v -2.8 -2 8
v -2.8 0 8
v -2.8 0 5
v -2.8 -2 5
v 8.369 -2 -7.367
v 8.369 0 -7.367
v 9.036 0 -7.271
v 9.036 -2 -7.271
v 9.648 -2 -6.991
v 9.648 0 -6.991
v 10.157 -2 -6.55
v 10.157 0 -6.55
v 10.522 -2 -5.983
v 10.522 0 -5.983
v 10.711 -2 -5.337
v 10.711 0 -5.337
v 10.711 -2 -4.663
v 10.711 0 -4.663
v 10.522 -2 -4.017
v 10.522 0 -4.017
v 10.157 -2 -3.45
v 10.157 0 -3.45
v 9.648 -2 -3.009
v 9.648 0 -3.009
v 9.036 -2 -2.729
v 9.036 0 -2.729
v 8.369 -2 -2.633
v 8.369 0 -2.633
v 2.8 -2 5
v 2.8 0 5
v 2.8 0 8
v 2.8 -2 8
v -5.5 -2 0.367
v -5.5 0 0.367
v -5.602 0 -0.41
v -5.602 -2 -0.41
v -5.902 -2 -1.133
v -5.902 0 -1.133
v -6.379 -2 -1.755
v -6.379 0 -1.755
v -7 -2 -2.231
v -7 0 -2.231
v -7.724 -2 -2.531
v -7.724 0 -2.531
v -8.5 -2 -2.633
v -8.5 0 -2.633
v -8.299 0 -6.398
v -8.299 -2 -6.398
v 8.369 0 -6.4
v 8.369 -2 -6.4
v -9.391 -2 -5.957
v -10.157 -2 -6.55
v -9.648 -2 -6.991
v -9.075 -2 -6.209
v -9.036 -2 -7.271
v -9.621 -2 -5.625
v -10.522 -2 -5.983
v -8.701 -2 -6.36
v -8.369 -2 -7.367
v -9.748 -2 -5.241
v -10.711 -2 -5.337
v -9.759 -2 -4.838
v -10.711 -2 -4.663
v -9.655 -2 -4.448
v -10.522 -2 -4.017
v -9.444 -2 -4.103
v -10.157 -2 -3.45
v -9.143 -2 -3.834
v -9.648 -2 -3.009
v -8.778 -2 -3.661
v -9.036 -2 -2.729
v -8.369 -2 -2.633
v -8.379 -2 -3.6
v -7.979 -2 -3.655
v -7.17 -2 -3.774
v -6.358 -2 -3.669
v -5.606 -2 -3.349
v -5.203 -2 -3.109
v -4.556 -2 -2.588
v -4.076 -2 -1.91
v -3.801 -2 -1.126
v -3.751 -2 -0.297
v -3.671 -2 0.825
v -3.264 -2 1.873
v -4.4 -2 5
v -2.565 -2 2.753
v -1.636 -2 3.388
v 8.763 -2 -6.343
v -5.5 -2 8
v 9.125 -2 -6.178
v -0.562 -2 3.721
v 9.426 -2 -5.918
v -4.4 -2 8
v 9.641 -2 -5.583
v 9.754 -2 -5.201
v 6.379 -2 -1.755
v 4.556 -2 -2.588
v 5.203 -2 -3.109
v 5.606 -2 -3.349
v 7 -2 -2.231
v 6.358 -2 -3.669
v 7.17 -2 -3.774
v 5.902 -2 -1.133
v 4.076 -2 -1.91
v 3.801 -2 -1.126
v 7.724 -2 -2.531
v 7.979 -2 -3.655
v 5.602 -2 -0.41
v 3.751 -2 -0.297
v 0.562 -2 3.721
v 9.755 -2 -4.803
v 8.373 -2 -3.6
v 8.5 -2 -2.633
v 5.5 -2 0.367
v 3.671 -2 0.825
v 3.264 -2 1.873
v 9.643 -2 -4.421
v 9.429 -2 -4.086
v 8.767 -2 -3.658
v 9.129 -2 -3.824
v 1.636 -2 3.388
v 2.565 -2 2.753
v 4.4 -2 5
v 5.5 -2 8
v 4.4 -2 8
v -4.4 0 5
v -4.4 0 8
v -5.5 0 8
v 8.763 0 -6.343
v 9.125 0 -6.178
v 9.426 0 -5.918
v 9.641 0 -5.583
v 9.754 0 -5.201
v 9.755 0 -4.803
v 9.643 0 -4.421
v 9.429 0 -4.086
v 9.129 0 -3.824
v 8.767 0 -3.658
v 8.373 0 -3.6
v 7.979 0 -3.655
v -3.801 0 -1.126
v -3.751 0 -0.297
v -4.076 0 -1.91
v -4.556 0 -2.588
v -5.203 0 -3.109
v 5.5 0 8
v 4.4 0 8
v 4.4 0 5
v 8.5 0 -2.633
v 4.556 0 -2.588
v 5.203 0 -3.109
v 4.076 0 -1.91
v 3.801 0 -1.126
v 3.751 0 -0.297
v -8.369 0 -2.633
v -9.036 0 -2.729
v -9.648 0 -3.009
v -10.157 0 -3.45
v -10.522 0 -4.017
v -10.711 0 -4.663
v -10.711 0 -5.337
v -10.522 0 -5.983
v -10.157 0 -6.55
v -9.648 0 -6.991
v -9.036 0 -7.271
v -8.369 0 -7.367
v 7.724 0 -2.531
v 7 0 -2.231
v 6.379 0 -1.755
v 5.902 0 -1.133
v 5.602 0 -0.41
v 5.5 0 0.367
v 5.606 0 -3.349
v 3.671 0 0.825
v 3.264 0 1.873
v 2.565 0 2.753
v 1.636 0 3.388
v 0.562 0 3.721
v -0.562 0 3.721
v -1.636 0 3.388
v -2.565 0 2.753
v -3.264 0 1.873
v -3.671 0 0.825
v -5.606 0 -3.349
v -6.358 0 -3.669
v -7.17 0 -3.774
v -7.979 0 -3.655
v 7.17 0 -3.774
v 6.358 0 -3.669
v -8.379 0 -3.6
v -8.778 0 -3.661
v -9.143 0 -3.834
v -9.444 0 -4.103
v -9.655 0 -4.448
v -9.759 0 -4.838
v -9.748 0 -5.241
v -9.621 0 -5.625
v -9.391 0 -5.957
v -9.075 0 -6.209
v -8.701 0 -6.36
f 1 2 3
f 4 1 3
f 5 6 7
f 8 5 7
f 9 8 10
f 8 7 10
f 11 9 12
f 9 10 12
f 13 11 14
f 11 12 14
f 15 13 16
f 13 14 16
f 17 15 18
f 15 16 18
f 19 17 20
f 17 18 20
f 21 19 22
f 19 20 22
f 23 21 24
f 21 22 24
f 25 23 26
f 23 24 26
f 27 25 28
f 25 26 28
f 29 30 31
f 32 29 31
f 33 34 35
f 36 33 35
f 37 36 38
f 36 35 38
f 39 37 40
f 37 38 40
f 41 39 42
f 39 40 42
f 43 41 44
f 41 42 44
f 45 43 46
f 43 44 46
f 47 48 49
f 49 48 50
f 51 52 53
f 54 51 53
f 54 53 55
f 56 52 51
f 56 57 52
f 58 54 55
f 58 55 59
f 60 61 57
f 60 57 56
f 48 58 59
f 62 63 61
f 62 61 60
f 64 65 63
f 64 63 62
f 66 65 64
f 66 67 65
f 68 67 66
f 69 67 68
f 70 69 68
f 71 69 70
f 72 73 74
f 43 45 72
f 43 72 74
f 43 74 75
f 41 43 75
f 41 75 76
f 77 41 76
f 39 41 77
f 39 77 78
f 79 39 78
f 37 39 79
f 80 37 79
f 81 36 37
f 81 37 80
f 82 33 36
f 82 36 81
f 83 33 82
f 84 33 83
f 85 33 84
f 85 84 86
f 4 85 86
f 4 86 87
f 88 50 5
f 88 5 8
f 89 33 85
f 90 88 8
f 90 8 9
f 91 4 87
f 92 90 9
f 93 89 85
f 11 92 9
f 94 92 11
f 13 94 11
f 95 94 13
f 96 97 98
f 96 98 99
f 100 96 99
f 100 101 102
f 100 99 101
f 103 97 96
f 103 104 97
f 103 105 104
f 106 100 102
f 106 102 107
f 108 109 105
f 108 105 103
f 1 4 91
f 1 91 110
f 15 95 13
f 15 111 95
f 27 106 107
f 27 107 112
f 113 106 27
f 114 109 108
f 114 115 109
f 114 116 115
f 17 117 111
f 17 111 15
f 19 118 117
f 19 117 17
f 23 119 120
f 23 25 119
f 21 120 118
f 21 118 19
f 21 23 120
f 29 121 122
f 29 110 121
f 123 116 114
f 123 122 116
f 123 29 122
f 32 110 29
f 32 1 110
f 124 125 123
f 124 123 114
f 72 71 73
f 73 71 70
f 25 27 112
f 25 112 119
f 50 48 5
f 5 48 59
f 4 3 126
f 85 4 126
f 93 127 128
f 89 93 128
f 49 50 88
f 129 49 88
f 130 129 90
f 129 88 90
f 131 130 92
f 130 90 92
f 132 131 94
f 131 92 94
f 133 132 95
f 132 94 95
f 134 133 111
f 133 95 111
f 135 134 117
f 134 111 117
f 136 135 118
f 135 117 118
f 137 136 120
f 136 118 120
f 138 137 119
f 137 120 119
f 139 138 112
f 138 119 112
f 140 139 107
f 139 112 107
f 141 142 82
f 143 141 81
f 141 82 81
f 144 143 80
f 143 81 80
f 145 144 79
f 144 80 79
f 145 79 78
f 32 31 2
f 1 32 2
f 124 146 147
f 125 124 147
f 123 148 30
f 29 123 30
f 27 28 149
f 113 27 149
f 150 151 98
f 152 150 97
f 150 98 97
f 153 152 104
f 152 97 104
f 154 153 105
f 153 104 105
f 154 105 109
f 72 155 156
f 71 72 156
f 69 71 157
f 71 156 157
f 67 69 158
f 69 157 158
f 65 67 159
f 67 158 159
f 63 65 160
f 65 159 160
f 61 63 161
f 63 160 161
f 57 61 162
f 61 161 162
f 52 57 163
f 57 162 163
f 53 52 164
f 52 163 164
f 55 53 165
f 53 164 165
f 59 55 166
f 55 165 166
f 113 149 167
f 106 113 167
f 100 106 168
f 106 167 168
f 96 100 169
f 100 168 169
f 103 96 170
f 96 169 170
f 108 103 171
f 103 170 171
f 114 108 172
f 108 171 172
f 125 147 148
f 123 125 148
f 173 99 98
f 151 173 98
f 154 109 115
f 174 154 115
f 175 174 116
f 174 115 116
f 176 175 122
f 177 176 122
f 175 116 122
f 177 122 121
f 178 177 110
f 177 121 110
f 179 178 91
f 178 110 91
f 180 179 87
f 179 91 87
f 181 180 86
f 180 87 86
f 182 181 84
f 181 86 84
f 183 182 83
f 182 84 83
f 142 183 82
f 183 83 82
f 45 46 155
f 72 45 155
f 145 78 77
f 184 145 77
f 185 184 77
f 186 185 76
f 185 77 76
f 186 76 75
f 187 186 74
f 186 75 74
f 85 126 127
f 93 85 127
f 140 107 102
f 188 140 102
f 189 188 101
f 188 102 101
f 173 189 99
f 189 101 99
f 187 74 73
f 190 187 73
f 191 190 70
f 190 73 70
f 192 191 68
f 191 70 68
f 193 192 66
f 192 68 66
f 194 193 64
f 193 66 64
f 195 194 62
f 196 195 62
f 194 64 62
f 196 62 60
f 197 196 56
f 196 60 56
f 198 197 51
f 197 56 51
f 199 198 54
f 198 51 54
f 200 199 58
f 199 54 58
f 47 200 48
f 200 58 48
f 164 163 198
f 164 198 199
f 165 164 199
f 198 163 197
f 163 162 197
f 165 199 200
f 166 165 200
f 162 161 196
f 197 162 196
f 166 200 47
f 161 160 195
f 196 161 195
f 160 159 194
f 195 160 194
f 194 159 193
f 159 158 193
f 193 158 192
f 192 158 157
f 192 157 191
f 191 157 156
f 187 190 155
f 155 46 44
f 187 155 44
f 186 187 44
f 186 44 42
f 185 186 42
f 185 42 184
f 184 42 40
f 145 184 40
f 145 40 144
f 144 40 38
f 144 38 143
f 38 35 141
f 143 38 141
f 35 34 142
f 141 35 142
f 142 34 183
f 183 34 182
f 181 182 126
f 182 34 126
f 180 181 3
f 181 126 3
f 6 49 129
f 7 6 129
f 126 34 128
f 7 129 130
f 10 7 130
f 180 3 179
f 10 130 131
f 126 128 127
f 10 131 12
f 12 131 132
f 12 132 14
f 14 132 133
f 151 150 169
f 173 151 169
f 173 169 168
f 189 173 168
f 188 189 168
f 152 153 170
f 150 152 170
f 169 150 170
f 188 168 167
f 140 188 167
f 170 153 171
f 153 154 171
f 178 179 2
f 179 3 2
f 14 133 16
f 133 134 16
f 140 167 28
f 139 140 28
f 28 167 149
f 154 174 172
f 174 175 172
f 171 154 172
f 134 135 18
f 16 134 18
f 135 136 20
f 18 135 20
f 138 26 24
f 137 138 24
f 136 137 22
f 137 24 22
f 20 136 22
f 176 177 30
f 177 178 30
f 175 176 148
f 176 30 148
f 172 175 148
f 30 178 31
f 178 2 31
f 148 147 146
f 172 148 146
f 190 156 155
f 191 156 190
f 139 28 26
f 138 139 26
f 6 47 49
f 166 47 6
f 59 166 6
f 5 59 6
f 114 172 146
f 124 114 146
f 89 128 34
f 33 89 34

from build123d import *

# Parameters (mm, degrees)
F1_DEPTH = 2
F3_DEPTH = 2.001


with BuildPart() as f1:
    # F0 (on Front) → F1 (new body)
    with BuildSketch(Plane.XZ):
        with BuildLine():
            Line((4.4, 8), (4.4, 5))
            Line((4.4, 5), (2.8, 5))
            Line((2.8, 5), (2.8, 8))
            Line((2.8, 8), (-2.8, 8))
            Line((-2.8, 8), (-2.8, 5))
            Line((-2.8, 5), (-4.4, 5))
            Line((-4.4, 5), (-4.4, 8))
            Line((-4.4, 8), (-5.5, 8))
            Line((-5.5, 8), (-5.5, 5))
            Line((-5.5, 5), (-5.5, 0.366807))
            ThreePointArc((-5.5, 0.366807), (-6.37868, -1.754513), (-8.5, -2.633193))
            Line((-8.5, -2.633193), (-8.368722, -2.633193))
            ThreePointArc((-8.368722, -2.633193), (-10.735529, -5), (-8.368722, -7.366807))
            Line((-8.368722, -7.366807), (8.368722, -7.366807))
            ThreePointArc((8.368722, -7.366807), (10.735529, -5), (8.368722, -2.633193))
            Line((8.368722, -2.633193), (8.5, -2.633193))
            ThreePointArc((8.5, -2.633193), (6.37868, -1.754513), (5.5, 0.366807))
            Line((5.5, 0.366807), (5.5, 5))
            Line((5.5, 5), (5.5, 8))
            Line((5.5, 8), (4.4, 8))
        make_face()
    extrude(amount=F1_DEPTH)

    # F2 (on face) → F3 (cut, through all)
    with BuildSketch(Plane.XZ.offset(2)):
        with BuildLine():
            ThreePointArc((5.203029, -3.108616), (4.076106, -1.909689), (3.751051, -0.296703))
            ThreePointArc((3.751051, -0.296703), (0, 3.762767), (-3.751051, -0.296703))
            ThreePointArc((-3.751051, -0.296703), (-4.076106, -1.909689), (-5.203029, -3.108616))
            Line((-5.203029, -3.108616), (-5.605626, -3.349153))
            ThreePointArc((-5.605626, -3.349153), (-6.760531, -3.749147), (-7.979135, -3.655299))
            ThreePointArc((-7.979135, -3.655299), (-9.759296, -4.837816), (-8.299049, -6.398265))
            Line((-8.299049, -6.398265), (8.368576, -6.4))
            ThreePointArc((8.368576, -6.4), (9.754839, -4.803326), (7.979135, -3.655299))
            ThreePointArc((7.979135, -3.655299), (6.760531, -3.749147), (5.605626, -3.349153))
            Line((5.605626, -3.349153), (5.203029, -3.108616))
        make_face()
    extrude(amount=-F3_DEPTH, mode=Mode.SUBTRACT)


solid = f1.part
